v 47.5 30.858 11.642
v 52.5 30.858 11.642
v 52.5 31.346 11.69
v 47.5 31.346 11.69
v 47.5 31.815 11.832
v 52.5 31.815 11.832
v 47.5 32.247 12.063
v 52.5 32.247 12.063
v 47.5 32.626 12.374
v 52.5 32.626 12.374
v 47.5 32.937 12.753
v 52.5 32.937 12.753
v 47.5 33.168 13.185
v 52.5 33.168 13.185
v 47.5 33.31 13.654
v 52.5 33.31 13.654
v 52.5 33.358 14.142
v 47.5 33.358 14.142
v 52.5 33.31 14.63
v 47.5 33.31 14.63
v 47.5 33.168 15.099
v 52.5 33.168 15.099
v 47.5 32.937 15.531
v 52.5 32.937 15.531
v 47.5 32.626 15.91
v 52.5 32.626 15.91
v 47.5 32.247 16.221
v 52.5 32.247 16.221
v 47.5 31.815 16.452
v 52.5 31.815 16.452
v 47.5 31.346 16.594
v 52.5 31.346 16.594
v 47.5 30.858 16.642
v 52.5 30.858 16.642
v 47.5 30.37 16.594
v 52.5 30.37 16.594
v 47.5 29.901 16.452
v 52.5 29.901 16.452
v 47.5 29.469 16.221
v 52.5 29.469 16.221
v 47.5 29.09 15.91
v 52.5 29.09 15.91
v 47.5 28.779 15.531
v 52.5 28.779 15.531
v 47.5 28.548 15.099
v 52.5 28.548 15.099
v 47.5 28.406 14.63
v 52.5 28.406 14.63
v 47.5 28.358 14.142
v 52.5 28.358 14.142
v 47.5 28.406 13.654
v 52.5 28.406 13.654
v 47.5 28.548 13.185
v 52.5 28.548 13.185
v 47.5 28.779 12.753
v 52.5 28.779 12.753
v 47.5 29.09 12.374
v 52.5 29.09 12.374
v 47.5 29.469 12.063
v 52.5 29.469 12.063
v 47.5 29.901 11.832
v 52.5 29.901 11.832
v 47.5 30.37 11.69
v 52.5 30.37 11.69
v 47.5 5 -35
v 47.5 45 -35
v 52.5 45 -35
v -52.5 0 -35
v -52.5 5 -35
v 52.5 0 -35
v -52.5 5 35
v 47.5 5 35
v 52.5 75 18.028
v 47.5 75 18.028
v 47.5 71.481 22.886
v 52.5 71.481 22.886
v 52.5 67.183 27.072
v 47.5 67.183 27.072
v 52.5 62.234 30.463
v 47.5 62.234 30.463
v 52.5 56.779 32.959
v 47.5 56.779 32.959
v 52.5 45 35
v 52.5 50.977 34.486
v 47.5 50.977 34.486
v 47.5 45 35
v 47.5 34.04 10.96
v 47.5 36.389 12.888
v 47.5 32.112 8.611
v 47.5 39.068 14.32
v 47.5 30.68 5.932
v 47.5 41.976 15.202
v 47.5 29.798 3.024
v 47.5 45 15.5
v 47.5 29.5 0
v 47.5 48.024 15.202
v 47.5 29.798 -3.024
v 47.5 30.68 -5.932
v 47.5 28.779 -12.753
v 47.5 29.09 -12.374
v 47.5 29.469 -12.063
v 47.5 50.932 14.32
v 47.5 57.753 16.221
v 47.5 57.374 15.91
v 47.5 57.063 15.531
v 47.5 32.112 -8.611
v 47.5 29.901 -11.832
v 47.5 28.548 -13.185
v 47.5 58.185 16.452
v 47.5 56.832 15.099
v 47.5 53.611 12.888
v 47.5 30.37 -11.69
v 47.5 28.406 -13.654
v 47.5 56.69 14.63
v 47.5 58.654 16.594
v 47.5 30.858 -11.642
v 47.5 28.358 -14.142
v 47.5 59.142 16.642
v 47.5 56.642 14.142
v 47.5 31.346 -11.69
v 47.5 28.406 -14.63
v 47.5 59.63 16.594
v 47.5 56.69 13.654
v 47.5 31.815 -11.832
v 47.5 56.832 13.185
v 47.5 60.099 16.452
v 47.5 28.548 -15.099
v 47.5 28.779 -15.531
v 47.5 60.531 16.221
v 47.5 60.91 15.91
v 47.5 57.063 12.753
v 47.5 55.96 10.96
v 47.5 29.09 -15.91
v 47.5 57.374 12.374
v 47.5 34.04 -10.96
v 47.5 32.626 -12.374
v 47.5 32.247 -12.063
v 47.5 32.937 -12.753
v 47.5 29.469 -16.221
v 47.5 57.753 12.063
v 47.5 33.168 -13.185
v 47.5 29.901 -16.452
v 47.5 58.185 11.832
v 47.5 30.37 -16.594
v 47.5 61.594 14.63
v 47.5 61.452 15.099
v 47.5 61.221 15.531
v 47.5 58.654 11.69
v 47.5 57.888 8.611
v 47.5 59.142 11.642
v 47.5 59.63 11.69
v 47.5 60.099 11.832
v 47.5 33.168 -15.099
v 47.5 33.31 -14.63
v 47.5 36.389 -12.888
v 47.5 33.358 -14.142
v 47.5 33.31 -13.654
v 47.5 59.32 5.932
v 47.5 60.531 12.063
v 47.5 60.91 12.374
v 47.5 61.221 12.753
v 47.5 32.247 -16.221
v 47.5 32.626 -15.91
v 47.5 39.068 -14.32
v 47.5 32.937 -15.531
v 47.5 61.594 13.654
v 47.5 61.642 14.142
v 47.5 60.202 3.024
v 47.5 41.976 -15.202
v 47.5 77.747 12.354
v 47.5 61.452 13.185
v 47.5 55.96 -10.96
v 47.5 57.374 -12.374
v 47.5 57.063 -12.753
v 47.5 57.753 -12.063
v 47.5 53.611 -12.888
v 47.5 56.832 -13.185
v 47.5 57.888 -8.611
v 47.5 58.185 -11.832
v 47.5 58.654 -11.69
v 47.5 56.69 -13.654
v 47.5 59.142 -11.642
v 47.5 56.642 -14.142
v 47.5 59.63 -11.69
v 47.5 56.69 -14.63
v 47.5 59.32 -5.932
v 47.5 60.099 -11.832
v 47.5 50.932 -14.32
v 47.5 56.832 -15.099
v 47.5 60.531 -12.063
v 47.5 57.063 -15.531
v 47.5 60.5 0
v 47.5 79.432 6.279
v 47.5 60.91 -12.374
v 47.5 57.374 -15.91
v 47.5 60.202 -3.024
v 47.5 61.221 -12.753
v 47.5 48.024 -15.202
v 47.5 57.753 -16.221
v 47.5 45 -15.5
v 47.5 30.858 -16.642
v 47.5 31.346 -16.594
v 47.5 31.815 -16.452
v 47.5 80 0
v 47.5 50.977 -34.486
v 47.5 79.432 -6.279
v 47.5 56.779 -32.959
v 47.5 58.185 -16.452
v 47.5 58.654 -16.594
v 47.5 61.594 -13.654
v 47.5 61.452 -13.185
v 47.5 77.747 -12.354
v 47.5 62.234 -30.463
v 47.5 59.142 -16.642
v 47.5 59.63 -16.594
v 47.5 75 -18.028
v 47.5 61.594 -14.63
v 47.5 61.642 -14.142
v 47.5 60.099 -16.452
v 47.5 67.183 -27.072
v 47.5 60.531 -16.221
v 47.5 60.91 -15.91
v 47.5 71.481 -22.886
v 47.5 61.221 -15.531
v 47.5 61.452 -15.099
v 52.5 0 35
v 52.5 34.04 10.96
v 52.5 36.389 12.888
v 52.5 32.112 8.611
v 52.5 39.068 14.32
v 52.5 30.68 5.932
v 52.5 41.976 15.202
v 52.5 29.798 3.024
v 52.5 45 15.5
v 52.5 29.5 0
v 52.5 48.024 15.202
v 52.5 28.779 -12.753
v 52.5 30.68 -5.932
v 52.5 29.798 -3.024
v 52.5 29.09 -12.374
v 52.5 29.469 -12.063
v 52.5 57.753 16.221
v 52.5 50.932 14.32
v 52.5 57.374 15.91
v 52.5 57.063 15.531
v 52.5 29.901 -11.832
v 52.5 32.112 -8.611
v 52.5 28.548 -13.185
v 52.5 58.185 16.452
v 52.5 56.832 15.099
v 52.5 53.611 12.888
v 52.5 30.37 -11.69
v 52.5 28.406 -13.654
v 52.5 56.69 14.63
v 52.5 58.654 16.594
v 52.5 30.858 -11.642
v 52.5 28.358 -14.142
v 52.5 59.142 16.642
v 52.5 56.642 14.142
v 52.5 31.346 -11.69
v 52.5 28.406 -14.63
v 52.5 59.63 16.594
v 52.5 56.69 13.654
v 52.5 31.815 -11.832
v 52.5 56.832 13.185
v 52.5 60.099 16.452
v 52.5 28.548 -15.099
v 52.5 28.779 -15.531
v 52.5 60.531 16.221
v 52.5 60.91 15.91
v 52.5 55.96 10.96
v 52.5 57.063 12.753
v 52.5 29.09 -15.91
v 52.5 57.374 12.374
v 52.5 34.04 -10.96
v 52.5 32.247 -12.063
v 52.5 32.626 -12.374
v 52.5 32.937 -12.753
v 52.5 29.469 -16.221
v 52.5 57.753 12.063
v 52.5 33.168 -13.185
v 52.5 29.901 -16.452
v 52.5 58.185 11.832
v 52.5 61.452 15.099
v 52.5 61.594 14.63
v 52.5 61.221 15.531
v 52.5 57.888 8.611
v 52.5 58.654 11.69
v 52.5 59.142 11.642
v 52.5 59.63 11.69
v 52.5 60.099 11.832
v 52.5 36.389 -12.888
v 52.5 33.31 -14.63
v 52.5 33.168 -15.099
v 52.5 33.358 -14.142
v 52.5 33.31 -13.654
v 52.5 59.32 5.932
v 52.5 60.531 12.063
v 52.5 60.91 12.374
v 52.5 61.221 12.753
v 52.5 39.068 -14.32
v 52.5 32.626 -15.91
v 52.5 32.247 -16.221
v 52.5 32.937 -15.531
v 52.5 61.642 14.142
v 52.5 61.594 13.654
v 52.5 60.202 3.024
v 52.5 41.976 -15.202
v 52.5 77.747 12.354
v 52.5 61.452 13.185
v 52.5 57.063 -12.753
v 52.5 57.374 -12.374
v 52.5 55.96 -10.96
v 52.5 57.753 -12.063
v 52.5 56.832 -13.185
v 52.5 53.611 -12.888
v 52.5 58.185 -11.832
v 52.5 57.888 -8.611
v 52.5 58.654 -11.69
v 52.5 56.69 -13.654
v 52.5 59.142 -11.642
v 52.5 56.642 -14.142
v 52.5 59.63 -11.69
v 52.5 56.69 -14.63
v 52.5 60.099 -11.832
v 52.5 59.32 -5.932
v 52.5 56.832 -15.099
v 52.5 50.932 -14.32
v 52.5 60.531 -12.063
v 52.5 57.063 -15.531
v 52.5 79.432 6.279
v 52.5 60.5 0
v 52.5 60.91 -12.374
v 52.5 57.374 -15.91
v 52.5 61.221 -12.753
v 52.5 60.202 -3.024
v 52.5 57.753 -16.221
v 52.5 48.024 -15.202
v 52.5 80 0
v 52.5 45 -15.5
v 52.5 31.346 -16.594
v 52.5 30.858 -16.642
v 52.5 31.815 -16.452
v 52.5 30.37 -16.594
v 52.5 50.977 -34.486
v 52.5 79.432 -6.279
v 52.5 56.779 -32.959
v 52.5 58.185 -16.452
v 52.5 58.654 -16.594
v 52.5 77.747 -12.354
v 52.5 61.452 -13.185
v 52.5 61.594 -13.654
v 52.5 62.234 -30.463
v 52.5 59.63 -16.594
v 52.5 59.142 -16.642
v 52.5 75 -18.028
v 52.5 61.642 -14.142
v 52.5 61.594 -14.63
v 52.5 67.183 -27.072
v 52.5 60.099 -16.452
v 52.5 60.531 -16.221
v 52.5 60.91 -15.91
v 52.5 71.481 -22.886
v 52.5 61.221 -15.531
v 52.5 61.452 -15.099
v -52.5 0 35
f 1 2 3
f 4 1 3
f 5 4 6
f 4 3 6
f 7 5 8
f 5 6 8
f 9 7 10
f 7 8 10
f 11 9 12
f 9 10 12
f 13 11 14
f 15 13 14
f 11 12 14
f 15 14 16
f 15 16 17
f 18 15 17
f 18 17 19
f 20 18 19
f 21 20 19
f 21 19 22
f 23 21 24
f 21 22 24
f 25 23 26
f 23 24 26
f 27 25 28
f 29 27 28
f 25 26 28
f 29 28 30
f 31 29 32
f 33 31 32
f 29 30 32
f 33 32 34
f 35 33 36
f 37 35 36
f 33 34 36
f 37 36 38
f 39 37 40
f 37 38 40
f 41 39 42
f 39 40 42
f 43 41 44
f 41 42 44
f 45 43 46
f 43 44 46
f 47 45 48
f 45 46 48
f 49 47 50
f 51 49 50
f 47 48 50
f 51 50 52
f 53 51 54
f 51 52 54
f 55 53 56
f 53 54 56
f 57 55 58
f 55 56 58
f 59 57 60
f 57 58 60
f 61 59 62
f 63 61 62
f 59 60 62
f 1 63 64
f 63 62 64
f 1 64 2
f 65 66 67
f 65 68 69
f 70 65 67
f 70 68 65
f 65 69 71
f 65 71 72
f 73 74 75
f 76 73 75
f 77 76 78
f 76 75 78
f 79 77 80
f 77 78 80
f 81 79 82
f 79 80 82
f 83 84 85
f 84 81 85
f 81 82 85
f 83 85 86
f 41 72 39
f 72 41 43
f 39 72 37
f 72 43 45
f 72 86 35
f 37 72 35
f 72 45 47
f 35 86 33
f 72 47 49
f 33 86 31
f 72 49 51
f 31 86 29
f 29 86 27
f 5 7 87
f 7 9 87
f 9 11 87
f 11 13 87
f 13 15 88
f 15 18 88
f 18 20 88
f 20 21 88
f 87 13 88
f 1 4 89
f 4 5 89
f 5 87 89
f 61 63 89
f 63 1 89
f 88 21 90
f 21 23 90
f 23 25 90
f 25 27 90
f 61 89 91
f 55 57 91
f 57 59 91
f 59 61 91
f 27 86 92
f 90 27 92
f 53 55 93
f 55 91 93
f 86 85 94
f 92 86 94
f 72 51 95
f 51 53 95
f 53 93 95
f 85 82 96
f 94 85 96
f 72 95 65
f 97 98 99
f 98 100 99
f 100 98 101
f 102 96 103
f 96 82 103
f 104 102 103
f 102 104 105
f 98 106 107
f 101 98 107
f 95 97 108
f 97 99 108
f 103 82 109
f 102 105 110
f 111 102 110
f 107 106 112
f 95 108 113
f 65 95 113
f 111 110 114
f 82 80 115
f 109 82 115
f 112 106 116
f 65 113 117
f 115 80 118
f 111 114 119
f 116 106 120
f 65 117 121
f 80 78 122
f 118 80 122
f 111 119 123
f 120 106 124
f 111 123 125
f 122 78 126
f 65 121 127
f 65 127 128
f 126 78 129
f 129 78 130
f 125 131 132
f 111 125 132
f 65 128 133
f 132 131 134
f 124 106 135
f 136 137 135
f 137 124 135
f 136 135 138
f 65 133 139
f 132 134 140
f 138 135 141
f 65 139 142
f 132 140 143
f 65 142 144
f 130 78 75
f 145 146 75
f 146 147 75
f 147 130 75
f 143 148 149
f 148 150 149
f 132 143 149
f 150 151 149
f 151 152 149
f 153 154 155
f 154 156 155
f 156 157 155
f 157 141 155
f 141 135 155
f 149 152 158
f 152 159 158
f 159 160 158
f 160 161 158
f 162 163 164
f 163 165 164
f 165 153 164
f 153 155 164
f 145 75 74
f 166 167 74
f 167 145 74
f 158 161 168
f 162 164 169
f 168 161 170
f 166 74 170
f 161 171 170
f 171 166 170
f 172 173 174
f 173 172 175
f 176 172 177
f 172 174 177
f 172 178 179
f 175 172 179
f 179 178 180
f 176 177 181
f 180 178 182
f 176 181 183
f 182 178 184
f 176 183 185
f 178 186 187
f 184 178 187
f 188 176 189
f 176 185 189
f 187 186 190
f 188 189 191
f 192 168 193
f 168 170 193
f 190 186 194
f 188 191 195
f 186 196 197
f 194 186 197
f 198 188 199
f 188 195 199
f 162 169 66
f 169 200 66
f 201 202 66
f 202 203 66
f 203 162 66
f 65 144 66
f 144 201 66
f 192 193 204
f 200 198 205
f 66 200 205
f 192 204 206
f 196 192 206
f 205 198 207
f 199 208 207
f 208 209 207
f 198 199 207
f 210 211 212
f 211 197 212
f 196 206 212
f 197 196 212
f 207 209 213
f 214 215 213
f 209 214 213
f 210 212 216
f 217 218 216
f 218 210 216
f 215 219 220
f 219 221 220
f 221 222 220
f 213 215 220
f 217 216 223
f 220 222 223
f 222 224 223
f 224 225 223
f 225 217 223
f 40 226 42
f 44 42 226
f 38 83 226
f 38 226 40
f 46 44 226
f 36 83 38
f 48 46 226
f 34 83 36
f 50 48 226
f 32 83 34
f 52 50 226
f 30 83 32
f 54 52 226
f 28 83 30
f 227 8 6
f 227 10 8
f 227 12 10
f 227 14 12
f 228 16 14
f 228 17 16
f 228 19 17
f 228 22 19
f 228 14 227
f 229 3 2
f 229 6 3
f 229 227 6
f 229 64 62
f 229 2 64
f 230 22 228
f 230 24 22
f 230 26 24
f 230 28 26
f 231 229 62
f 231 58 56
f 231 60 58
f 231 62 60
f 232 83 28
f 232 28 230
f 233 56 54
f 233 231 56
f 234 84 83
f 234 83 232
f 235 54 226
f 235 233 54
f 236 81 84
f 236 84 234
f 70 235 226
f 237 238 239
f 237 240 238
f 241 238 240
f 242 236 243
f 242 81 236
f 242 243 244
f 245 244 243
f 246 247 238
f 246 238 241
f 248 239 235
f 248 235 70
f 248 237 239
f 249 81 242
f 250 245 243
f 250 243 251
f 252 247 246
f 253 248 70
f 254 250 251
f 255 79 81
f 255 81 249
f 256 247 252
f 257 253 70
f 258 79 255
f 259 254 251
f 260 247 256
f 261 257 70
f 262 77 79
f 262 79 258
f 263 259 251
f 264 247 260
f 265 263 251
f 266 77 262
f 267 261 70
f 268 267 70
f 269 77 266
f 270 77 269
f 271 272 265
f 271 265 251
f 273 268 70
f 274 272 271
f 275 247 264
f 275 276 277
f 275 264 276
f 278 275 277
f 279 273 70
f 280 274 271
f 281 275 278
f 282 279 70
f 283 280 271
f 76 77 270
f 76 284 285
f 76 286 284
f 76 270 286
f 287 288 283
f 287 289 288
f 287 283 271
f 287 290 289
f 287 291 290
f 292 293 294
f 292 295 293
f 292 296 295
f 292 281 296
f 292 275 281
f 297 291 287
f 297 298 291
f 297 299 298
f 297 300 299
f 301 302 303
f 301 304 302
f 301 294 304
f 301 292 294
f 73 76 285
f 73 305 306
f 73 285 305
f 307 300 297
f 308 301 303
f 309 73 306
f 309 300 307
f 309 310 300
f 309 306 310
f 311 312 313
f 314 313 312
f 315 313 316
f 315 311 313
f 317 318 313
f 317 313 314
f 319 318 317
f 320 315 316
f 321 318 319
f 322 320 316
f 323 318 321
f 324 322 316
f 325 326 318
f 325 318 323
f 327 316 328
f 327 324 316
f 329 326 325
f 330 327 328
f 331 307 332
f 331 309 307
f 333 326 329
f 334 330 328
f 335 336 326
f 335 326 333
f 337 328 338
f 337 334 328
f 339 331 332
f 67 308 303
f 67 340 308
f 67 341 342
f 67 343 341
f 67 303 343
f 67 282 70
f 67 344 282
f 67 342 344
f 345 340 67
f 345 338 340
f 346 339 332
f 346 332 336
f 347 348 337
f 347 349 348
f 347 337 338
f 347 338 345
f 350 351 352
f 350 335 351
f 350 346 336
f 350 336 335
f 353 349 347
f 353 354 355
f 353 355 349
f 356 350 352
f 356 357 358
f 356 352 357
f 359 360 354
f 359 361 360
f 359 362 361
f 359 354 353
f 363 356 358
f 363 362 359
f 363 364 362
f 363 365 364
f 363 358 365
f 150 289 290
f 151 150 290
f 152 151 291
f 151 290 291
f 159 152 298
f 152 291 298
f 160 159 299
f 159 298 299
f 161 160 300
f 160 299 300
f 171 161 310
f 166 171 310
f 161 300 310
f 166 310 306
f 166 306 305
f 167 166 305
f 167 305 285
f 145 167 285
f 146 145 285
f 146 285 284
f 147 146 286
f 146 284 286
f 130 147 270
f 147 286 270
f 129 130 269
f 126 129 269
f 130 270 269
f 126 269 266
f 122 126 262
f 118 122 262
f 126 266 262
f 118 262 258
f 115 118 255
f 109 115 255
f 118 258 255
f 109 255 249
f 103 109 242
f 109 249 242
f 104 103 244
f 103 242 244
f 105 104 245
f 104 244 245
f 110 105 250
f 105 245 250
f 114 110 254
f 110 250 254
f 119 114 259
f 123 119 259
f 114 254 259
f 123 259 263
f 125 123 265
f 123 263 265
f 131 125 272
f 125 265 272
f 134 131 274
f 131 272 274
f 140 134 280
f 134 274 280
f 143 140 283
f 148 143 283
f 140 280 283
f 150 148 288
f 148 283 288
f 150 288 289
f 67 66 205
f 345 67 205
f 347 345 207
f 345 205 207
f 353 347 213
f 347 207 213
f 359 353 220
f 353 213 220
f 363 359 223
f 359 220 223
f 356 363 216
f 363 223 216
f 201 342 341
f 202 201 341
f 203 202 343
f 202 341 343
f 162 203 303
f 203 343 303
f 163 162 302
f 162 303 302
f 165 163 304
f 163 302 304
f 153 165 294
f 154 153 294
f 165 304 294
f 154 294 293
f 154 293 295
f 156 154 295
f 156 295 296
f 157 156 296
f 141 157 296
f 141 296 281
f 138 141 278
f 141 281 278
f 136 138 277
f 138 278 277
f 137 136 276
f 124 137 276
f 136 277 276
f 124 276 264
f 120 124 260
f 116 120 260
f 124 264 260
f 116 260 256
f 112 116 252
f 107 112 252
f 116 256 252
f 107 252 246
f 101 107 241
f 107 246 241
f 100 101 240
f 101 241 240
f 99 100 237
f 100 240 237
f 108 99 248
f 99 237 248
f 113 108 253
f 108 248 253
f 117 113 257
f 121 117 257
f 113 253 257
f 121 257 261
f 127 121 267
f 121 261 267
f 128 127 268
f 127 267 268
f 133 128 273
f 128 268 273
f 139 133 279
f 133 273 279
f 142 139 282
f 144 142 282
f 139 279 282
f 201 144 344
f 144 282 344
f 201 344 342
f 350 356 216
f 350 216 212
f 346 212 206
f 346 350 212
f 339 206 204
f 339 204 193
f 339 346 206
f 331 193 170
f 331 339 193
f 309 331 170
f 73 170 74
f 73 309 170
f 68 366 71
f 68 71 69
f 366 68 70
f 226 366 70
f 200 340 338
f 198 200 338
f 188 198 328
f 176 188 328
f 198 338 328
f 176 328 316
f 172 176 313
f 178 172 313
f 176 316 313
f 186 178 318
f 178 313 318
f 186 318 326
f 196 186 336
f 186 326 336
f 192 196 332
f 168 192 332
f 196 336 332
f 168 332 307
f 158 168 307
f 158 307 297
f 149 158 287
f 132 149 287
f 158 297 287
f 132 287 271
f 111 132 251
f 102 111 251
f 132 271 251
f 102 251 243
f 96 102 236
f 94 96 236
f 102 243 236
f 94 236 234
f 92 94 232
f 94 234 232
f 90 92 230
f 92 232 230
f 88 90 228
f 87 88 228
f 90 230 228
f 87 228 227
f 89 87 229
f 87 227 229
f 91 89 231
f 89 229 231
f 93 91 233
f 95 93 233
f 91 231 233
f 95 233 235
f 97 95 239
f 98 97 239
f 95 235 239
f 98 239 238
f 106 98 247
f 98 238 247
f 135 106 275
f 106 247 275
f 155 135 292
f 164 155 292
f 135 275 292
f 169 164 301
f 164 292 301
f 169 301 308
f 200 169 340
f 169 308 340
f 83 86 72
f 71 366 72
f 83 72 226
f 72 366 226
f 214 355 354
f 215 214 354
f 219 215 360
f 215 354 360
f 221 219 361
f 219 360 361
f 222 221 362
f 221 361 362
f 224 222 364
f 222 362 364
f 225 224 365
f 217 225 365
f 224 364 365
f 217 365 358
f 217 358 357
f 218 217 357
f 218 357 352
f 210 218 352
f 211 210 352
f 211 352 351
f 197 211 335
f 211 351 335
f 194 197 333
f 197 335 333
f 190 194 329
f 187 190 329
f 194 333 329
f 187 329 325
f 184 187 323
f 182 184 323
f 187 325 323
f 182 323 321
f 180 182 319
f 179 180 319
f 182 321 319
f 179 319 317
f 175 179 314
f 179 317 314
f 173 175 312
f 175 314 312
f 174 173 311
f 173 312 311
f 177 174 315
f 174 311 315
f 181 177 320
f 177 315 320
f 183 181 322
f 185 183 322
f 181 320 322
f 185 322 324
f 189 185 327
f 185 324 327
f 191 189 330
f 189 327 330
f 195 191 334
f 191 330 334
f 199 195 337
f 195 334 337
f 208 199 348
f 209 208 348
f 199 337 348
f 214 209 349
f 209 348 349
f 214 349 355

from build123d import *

# Parameters (mm, degrees)
SKETCH1_W           = 105
SKETCH1_H           = 70
BOSS_EXTRUDE1_DEPTH = 5
SKETCH2_W           = 5
SKETCH2_H           = 70
BOSS_EXTRUDE2_DEPTH = 70
CUT_EXTRUDE1_DEPTH  = 20
SKETCH4_R           = 25.5
CUT_EXTRUDE2_DEPTH  = 10
BOSS_EXTRUDE3_DEPTH = 5
SKETCH6_R           = 25.5
SKETCH6_R_2         = 15.5
BOSS_EXTRUDE4_DEPTH = 5
SKETCH7_R           = 2.5
CUT_EXTRUDE3_DEPTH  = 5


with BuildPart() as part:
    # Sketch1 → Boss-Extrude1 (new body)
    with BuildSketch(Plane(origin=(0, 0, 0), x_dir=(1, 0, 0), z_dir=(0, 1, 0))):
        Rectangle(SKETCH1_W, SKETCH1_H)
    extrude(amount=BOSS_EXTRUDE1_DEPTH)

    # Sketch2 → Boss-Extrude2 (add)
    with BuildSketch(Plane(origin=(0, 5, 0), x_dir=(1, 0, 0), z_dir=(0, 1, 0))):
        with Locations((50, 0)):
            Rectangle(SKETCH2_W, SKETCH2_H)
    extrude(amount=BOSS_EXTRUDE2_DEPTH)

    # Sketch3 → Cut-Extrude1 (cut)
    with BuildSketch(Plane.ZY.offset(-47.5)):
        with BuildLine():
            Line((-18.027756377, 75), (-35, 75))
            Line((-35, 75), (-35, 45))
            ThreePointArc((-35, 45), (-30.462858313, 62.234101758), (-18.027756377, 75))
        make_face()
        with BuildLine():
            Line((35, 75), (18.027756377, 75))
            ThreePointArc((18.027756377, 75), (30.462858313, 62.234101758), (35, 45))
            Line((35, 45), (35, 75))
        make_face()
    extrude(amount=-CUT_EXTRUDE1_DEPTH, mode=Mode.SUBTRACT)

    # Sketch4 → Cut-Extrude2 (cut)
    with BuildSketch(Plane.ZY.offset(-47.5)):
        with Locations((0, 45)):
            Circle(SKETCH4_R)
    extrude(amount=-CUT_EXTRUDE2_DEPTH, mode=Mode.SUBTRACT)

    # Sketch5 → Boss-Extrude3 (add)
    with BuildSketch(Plane(origin=(52.5, 0, 0), x_dir=(0, 0, -1), z_dir=(1, 0, 0))):
        with BuildLine():
            Line((-18.027756377, 75), (18.027756377, 75))
            ThreePointArc((18.027756377, 75), (0, 80), (-18.027756377, 75))
        make_face()
    extrude(amount=-BOSS_EXTRUDE3_DEPTH)

    # Sketch6 → Boss-Extrude4 (add)
    with BuildSketch(Plane(origin=(52.5, 0, 0), x_dir=(0, 0, -1), z_dir=(1, 0, 0))):
        with Locations((0, 45)):
            Circle(SKETCH6_R)
        with Locations((0, 45)):
            Circle(SKETCH6_R_2, mode=Mode.SUBTRACT)
    extrude(amount=-BOSS_EXTRUDE4_DEPTH)

    # Sketch7 → Cut-Extrude3 (cut)
    with BuildSketch(Plane(origin=(52.5, 0, 0), x_dir=(0, 0, -1), z_dir=(1, 0, 0))):
        with Locations((14.142135624, 59.142135624)):
            Circle(SKETCH7_R)
        with Locations((14.142135624, 30.857864376)):
            Circle(SKETCH7_R)
        with Locations((-14.142135624, 30.857864376)):
            Circle(SKETCH7_R)
        with Locations((-14.142135624, 59.142135624)):
            Circle(SKETCH7_R)
    extrude(amount=-CUT_EXTRUDE3_DEPTH, mode=Mode.SUBTRACT)


solid = part.part
